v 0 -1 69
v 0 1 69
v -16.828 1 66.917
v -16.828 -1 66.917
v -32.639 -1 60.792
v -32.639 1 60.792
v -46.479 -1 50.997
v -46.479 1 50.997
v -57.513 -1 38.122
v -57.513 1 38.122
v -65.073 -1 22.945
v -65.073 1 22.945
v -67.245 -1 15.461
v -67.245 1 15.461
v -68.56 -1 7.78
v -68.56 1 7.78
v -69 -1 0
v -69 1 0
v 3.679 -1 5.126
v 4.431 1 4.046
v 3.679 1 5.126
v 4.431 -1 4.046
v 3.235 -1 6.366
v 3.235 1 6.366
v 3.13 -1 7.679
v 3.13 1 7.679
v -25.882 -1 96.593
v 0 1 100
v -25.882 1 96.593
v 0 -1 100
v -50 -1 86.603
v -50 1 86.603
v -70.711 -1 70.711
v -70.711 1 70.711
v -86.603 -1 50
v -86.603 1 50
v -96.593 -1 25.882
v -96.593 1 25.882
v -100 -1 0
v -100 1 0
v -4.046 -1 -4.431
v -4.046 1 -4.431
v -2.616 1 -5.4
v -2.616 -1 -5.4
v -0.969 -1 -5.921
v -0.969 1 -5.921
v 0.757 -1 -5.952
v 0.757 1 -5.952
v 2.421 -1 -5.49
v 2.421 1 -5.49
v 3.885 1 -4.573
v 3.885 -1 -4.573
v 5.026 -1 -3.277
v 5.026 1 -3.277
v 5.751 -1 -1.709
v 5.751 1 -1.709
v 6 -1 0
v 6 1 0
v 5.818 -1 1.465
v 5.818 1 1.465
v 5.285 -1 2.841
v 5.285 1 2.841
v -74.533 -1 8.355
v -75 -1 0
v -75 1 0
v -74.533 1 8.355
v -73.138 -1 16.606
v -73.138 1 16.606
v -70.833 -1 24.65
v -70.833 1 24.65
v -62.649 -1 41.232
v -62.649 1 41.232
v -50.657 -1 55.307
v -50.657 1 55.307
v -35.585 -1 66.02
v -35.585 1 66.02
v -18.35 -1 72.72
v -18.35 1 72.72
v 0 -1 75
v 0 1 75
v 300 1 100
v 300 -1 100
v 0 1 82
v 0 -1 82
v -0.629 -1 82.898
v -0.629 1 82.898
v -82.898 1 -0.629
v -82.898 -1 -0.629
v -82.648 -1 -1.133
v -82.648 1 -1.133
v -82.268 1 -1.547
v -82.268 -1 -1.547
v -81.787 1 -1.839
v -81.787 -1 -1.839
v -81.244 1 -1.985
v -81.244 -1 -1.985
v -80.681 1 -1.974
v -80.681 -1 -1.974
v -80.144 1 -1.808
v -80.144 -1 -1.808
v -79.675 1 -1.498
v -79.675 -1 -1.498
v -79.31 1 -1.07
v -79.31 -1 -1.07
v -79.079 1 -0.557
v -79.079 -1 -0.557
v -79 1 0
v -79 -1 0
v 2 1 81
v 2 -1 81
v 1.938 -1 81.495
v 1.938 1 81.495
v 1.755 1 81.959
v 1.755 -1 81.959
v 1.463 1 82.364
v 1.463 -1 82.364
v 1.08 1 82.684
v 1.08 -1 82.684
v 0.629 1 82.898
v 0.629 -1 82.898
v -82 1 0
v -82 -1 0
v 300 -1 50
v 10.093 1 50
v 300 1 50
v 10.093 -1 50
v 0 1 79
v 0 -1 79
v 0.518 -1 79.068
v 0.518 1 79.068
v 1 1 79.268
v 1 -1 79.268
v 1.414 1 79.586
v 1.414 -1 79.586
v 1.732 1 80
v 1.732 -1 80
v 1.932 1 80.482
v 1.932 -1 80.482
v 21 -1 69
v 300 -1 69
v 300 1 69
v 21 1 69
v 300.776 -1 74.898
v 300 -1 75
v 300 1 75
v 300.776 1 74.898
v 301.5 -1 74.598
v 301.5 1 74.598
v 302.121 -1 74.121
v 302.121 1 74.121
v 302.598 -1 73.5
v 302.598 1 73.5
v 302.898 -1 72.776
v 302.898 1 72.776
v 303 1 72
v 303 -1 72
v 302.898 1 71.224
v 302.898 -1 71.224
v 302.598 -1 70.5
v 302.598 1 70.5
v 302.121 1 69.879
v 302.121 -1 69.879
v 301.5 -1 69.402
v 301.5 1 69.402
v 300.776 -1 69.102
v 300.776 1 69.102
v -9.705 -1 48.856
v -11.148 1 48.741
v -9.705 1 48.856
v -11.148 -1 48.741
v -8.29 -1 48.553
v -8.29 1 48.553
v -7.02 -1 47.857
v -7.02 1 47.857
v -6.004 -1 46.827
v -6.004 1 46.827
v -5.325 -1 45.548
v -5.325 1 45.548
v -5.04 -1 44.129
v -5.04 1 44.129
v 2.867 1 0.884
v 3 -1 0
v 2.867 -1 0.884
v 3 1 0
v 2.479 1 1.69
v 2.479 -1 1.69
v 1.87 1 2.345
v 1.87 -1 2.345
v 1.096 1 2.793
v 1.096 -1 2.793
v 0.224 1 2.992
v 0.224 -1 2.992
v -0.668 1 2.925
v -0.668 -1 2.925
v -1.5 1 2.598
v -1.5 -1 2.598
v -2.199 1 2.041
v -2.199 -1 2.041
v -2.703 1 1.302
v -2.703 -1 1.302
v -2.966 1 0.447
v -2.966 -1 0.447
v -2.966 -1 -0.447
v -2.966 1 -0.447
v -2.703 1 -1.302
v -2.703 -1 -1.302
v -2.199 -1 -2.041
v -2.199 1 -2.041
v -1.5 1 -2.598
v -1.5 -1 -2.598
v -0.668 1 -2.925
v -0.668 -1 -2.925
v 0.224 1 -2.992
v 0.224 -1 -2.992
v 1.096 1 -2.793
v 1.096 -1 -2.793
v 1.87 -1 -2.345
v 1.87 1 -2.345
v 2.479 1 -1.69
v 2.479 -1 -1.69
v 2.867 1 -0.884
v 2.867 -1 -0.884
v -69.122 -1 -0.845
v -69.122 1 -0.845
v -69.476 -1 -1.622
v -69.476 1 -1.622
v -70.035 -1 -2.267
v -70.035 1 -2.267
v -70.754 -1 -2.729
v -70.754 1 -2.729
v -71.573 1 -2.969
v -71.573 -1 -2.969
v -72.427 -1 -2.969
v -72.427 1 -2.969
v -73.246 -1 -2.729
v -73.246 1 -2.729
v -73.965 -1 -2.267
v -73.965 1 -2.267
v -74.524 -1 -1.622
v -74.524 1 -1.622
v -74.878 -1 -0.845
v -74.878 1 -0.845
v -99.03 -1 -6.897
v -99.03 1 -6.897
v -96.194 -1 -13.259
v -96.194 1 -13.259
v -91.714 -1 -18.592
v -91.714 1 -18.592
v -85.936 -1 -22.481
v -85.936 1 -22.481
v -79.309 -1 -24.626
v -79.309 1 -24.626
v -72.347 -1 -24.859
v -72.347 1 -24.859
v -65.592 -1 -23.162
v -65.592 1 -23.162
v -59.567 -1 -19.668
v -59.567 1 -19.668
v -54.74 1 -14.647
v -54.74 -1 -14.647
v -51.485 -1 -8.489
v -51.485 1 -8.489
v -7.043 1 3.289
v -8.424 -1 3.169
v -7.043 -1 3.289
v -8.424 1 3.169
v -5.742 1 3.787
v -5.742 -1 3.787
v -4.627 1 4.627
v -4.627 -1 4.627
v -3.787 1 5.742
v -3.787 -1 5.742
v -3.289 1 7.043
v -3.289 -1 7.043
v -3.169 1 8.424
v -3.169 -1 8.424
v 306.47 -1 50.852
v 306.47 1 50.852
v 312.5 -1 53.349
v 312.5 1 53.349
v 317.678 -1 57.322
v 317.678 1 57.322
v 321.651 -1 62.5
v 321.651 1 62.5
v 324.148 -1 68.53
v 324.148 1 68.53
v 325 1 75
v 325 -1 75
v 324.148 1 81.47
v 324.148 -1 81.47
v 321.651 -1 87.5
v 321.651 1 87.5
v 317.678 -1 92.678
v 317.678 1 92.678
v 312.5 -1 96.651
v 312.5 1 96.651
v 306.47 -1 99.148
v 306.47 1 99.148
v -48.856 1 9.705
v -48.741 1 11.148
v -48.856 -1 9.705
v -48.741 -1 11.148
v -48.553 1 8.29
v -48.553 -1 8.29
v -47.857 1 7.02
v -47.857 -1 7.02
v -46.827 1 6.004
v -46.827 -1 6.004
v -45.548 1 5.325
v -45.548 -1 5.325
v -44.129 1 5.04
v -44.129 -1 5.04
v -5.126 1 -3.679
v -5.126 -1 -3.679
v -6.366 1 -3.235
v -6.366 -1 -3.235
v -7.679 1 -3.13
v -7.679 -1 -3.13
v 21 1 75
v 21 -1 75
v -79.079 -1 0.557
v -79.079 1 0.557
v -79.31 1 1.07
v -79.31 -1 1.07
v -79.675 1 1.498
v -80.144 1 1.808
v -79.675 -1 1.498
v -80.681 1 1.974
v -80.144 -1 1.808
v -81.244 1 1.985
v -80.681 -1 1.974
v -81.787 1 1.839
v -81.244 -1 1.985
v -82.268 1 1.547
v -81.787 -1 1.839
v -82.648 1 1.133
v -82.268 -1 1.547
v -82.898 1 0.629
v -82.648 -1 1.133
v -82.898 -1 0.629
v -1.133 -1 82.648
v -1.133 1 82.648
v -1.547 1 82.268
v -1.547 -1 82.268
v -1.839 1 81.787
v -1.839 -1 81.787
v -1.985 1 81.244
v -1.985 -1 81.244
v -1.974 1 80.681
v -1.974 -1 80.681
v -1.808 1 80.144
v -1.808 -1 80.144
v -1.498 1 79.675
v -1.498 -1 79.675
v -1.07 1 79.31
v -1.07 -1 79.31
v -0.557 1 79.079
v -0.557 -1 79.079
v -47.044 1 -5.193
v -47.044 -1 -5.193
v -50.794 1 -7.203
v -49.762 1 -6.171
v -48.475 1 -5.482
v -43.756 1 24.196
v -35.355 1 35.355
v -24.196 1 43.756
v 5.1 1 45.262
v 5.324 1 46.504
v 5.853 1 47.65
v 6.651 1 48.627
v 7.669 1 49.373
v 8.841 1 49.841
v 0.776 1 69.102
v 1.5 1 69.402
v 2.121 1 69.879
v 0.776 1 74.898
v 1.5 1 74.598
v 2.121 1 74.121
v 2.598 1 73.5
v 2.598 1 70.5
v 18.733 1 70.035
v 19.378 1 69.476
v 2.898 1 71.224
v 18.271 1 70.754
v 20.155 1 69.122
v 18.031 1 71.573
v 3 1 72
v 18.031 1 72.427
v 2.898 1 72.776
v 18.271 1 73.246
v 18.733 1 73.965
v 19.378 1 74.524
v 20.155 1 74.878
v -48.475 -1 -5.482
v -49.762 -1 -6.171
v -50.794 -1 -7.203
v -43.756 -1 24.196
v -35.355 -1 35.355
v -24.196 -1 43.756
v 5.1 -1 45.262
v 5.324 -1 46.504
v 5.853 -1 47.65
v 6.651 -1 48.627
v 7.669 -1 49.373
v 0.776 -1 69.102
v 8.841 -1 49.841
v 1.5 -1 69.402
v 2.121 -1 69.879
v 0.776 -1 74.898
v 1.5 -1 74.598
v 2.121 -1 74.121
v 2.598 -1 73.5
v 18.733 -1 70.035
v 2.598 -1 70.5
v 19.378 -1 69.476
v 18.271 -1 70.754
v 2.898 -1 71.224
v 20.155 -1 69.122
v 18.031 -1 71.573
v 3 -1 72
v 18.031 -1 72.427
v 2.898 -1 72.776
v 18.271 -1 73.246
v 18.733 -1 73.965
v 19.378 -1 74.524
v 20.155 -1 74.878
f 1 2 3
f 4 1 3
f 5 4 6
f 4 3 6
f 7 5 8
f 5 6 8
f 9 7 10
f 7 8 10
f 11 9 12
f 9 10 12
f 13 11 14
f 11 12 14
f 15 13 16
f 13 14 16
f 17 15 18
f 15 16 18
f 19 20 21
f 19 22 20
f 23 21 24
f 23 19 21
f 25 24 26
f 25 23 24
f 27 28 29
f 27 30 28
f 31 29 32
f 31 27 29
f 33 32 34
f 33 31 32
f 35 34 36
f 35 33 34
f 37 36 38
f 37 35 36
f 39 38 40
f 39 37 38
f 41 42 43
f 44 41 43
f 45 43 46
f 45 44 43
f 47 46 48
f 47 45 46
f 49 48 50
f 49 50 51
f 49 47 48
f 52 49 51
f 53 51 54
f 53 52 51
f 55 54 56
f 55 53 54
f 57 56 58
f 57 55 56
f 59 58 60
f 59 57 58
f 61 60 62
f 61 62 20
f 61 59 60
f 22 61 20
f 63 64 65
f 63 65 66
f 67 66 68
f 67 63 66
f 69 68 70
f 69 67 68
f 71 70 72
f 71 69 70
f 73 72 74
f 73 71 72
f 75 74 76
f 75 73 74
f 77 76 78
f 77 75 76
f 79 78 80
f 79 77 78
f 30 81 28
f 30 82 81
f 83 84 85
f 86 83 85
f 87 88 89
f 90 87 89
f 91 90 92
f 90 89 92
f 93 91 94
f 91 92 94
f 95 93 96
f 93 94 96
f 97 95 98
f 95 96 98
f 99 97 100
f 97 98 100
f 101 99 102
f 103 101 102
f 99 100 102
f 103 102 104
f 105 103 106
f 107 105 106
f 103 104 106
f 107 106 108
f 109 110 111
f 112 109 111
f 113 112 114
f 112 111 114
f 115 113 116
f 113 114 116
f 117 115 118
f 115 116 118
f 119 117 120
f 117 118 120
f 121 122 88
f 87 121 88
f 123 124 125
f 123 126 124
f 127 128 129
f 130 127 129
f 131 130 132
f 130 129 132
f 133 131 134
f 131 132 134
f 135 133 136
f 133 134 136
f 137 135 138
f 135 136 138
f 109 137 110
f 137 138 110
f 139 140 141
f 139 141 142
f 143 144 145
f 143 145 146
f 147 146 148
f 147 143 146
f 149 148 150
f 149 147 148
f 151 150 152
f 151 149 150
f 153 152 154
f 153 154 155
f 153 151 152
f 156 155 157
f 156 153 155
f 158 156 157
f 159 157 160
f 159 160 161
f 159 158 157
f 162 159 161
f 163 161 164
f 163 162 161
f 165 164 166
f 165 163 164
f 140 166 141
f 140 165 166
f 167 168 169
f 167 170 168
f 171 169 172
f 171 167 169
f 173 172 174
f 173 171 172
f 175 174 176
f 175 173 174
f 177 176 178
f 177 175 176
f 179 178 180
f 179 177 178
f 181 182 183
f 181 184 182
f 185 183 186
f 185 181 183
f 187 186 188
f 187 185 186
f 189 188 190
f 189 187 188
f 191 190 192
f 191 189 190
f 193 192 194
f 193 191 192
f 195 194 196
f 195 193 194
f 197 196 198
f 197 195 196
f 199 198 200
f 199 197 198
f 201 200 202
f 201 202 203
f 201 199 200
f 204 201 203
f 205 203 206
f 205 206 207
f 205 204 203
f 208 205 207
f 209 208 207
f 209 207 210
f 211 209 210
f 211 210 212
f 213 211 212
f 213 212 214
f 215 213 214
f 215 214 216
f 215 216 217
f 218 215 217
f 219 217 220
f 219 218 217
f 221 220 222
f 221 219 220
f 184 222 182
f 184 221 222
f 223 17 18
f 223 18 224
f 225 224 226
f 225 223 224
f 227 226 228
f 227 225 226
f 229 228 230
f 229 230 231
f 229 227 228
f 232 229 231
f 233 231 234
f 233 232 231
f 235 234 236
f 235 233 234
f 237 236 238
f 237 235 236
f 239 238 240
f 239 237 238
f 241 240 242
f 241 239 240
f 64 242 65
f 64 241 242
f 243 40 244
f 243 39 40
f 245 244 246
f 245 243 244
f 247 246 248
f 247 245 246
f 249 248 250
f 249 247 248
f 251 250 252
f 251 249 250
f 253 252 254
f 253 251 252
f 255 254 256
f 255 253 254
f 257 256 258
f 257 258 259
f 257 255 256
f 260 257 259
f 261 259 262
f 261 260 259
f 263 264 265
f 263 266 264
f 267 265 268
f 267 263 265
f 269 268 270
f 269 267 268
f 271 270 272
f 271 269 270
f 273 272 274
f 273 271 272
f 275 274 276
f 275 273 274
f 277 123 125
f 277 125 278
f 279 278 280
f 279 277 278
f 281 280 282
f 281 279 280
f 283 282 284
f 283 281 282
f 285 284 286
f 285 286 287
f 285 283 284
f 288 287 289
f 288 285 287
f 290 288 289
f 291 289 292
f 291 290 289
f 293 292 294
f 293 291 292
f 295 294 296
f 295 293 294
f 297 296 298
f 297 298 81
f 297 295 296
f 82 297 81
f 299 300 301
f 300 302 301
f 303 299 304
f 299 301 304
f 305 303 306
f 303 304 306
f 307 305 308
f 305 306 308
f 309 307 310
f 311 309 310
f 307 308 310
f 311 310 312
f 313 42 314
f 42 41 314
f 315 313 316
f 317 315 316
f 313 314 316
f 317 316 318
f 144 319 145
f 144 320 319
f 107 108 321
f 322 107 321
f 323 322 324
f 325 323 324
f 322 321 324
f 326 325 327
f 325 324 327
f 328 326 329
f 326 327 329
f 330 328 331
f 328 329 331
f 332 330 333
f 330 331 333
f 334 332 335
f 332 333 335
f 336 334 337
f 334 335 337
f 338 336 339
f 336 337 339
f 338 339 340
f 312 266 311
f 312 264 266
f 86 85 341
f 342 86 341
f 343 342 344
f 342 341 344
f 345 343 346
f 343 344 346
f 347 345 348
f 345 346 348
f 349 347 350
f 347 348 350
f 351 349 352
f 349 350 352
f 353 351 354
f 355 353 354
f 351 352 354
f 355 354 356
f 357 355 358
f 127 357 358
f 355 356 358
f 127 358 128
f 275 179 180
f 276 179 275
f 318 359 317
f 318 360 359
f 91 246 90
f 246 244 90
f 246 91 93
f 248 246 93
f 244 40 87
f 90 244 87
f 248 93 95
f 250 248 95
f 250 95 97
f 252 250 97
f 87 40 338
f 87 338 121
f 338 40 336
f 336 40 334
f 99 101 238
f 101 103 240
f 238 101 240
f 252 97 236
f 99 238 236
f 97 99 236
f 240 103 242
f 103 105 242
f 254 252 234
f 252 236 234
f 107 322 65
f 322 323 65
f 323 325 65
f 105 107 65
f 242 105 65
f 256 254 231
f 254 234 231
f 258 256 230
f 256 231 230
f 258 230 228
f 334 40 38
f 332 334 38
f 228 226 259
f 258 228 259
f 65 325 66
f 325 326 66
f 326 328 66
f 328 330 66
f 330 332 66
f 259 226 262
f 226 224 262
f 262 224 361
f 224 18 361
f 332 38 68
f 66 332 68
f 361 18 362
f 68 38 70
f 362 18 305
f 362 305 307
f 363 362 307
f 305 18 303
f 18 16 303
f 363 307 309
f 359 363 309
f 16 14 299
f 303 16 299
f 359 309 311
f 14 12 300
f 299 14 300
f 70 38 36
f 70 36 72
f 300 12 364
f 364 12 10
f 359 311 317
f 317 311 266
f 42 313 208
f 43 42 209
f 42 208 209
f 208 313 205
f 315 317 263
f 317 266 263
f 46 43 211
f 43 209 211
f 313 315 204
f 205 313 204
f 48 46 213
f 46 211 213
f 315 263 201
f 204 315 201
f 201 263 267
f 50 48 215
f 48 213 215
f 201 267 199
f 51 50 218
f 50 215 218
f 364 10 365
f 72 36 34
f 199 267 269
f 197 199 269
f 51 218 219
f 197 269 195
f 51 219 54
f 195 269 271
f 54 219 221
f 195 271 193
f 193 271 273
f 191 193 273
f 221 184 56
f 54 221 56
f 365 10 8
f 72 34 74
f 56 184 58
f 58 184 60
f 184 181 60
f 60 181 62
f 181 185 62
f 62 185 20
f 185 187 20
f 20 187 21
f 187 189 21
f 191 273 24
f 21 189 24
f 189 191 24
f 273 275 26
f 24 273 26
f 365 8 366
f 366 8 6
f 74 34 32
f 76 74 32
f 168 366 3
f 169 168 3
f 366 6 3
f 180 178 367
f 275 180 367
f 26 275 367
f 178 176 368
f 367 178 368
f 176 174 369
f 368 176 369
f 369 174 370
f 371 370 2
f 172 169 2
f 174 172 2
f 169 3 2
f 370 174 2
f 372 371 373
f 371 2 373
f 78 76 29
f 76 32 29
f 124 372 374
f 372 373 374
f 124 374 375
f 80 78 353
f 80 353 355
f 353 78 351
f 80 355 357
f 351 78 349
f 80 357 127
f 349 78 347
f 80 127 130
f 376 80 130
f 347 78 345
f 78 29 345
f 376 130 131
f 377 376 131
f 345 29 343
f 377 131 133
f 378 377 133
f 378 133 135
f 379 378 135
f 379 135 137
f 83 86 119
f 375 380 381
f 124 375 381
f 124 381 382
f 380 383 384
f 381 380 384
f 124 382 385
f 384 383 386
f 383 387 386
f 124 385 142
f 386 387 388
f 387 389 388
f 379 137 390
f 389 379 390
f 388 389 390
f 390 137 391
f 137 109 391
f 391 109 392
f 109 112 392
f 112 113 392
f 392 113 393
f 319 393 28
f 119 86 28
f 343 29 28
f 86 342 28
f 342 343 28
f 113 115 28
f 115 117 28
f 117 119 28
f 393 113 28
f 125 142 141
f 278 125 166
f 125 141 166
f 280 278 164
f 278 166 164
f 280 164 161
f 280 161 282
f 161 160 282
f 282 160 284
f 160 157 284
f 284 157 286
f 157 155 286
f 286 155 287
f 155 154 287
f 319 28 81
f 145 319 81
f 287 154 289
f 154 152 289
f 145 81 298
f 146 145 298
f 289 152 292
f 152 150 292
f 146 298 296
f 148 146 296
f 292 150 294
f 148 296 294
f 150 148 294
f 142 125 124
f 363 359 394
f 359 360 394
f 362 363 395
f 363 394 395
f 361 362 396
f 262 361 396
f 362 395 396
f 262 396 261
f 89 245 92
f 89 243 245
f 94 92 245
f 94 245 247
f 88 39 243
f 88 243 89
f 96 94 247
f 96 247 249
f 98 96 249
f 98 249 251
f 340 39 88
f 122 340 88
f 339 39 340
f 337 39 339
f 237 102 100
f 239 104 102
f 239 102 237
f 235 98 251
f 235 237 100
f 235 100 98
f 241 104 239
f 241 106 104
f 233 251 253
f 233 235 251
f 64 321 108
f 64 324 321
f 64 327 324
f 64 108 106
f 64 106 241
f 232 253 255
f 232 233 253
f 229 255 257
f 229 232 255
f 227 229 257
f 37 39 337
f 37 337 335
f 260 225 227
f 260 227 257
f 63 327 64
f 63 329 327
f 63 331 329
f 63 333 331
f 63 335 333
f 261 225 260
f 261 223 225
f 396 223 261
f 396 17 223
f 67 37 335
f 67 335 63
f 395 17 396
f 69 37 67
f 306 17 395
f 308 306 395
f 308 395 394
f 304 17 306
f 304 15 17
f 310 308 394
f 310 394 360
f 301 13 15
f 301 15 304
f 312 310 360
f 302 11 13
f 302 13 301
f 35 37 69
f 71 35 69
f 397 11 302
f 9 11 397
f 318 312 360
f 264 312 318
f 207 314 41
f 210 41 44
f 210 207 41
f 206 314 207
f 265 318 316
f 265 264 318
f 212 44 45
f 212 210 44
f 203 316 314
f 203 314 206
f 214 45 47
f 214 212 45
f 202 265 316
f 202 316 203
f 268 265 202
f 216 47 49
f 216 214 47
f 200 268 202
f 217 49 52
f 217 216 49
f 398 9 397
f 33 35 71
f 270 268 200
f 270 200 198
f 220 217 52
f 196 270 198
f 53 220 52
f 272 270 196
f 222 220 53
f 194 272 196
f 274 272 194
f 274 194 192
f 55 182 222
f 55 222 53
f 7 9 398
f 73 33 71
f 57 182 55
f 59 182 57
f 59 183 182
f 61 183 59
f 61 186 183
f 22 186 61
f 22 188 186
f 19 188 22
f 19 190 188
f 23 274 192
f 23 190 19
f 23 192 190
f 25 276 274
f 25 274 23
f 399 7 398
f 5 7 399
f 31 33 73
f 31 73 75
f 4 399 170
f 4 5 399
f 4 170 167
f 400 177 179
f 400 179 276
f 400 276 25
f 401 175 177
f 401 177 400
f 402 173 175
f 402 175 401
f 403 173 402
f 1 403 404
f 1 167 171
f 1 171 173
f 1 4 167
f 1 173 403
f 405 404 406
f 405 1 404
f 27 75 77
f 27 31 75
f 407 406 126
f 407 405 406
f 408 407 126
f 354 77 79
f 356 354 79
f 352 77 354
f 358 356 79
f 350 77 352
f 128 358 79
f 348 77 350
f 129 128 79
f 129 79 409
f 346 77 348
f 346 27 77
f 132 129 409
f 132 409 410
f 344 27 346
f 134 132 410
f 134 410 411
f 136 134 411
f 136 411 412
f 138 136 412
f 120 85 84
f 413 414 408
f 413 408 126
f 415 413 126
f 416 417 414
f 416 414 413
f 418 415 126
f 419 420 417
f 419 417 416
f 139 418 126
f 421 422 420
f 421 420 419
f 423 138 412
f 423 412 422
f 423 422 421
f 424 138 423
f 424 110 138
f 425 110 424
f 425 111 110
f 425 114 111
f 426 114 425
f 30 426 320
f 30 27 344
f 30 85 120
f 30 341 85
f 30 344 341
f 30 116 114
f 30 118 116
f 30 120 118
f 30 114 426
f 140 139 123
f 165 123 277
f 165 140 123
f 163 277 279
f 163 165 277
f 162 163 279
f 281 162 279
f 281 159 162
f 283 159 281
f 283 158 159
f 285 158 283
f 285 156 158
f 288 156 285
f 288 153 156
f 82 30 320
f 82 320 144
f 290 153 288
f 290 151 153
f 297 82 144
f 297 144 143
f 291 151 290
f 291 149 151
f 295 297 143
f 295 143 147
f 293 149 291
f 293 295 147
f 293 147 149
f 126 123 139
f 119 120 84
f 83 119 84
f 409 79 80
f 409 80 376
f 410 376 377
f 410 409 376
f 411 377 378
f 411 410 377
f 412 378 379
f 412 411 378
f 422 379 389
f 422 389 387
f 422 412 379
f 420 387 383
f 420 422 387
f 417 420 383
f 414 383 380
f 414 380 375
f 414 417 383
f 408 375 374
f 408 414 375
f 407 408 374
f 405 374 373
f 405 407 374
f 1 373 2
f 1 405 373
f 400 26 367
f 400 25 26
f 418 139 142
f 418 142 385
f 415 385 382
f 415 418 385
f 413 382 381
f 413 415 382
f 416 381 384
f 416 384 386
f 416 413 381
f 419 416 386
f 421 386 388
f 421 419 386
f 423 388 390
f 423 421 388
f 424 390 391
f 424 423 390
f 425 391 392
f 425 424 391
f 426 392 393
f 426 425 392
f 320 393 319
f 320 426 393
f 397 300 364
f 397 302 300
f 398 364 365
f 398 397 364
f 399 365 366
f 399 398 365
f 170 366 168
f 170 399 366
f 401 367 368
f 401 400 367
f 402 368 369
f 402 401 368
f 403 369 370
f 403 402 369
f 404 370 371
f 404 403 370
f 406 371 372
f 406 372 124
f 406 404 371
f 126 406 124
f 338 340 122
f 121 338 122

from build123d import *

# Parameters (mm, degrees)
F0_R     = 3
F1_DEPTH = 1
F2_R     = 5
F2_R_2   = 4.99999
F6_DEPTH = 25


# Not quite as in the source:
# - a fillet or chamfer is up to 0.001 mm smaller than in the source, because OpenCascade refuses the exact size
# - a feature of the source that left no trace in its solid (it failed there, or was rolled back) is left out


with BuildPart() as f1:
    # F0 (on Front) → F1 (new body, symmetric)
    with BuildSketch(Plane.XZ):
        with BuildLine():
            ThreePointArc((-70.8333333333, 24.6503324296), (-91.1374306092, 19.0940653956), (-100, 0))
            ThreePointArc((-100, 0), (-77.7052620956, -24.8532001359), (-50.5854754405, -5.3787536225))
            ThreePointArc((-50.5854754405, -5.3787536225), (-50.1467998641, -2.7052620956), (-50, 0))
            ThreePointArc((-50, 0), (-54.1054233512, 13.7264950613), (-65.0733333333, 22.9447442542))
            ThreePointArc((-65.0733333333, 22.9447442542), (-68.0112490695, 11.6391580452), (-69, 0))
            ThreePointArc((-69, 0), (-72, -3), (-75, 0))
            ThreePointArc((-75, 0), (-73.9509972887, 12.5), (-70.8333333333, 24.6503324296))
        make_face()
        with BuildLine():
            ThreePointArc((-50, 0), (-50.1467998641, -2.7052620956), (-50.5854754405, -5.3787536225))
            Line((-50.5854754405, -5.3787536225), (-5.1961524227, -3))
            ThreePointArc((-5.1961524227, -3), (-6, 0), (-5.1961524227, 3))
            Line((-5.1961524227, 3), (-49.7147645476, 5.3331215982))
            ThreePointArc((-49.7147645476, 5.3331215982), (-49.9286402147, 2.6703719425), (-50, 0))
        make_face()
        with BuildLine():
            Line((300, 100), (0, 100))
            ThreePointArc((0, 100), (-70.7106781187, 70.7106781187), (-100, 0))
            ThreePointArc((-100, 0), (-91.1374306092, 19.0940653956), (-70.8333333333, 24.6503324296))
            ThreePointArc((-70.8333333333, 24.6503324296), (-43.4524168935, 61.1300864232), (0, 75))
            ThreePointArc((0, 75), (2.1213203436, 74.1213203436), (3, 72))
            ThreePointArc((3, 72), (2.1213203436, 69.8786796564), (0, 69))
            ThreePointArc((0, 69), (-39.861087833, 56.3213429951), (-65.0733333333, 22.9447442542))
            ThreePointArc((-65.0733333333, 22.9447442542), (-54.1054233512, 13.7264950613), (-50, 0))
            ThreePointArc((-50, 0), (-49.9286402147, 2.6703719425), (-49.7147645476, 5.3331215982))
            ThreePointArc((-49.7147645476, 5.3331215982), (-35.3553390593, 35.3553390593), (-5.3331215982, 49.7147645476))
            ThreePointArc((-5.3331215982, 49.7147645476), (-2.6703719425, 49.9286402147), (0, 50))
            Line((0, 50), (5.3480701549, 50))
            Line((5.3480701549, 50), (300, 50))
            ThreePointArc((300, 50), (284.5889649926, 55.314980315), (275.730677801, 69))
            Line((275.730677801, 69), (21, 69))
            ThreePointArc((21, 69), (18, 72), (21, 75))
            Line((21, 75), (275, 75))
            ThreePointArc((275, 75), (282.3223304703, 92.6776695297), (300, 100))
        make_face()
        with BuildLine():
            Line((3, 5.1961524227), (5.3480701549, 50))
            Line((5.3480701549, 50), (0, 50))
            ThreePointArc((0, 50), (-2.6703719425, 49.9286402147), (-5.3331215982, 49.7147645476))
            Line((-5.3331215982, 49.7147645476), (-3, 5.1961524227))
            ThreePointArc((-3, 5.1961524227), (0, 6), (3, 5.1961524227))
        make_face()
        with BuildLine():
            ThreePointArc((-5.1961524227, 3), (-6, 0), (-5.1961524227, -3))
            ThreePointArc((-5.1961524227, -3), (1.5529142706, -5.7955549577), (6, 0))
            ThreePointArc((6, 0), (5.1961524227, 3), (3, 5.1961524227))
            ThreePointArc((3, 5.1961524227), (0, 6), (-3, 5.1961524227))
            ThreePointArc((-3, 5.1961524227), (-4.2426406871, 4.2426406871), (-5.1961524227, 3))
        make_face()
        Circle(F0_R, mode=Mode.SUBTRACT)
        with BuildLine():
            ThreePointArc((325, 75), (317.6776695297, 92.6776695297), (300, 100))
            ThreePointArc((300, 100), (282.3223304703, 92.6776695297), (275, 75))
            Line((275, 75), (300, 75))
            ThreePointArc((300, 75), (302.1213203436, 74.1213203436), (303, 72))
            ThreePointArc((303, 72), (302.1213203436, 69.8786796564), (300, 69))
            Line((300, 69), (275.730677801, 69))
            ThreePointArc((275.730677801, 69), (284.5889649926, 55.314980315), (300, 50))
            ThreePointArc((300, 50), (317.6776695297, 57.3223304703), (325, 75))
        make_face()
    extrude(amount=F1_DEPTH, both=True)

    # F2 (call 1 of 8: OpenCascade refuses the feature's edges together)
    f2_edges = [f1.edges().sort_by_distance(p)[0] for p in [
        (-49.714765, 0, 5.333122),
    ]]
    fillet(f2_edges, radius=F2_R)

    # F2#2 (call 2 of 8)
    f2_2_edges = [f1.edges().sort_by_distance(p)[0] for p in [
        (5.34807, 0, 50),
    ]]
    fillet(f2_2_edges, radius=F2_R)

    # F2#3 (call 3 of 8)
    f2_3_edges = [f1.edges().sort_by_distance(p)[0] for p in [
        (-5.333122, 0, 49.714765),
    ]]
    fillet(f2_3_edges, radius=F2_R)

    # F2#4 (call 4 of 8)
    f2_4_edges = [f1.edges().sort_by_distance(p)[0] for p in [
        (-5.196152, 0, -3),
    ]]
    fillet(f2_4_edges, radius=F2_R)

    # F2#5 (call 5 of 8)
    f2_5_edges = [f1.edges().sort_by_distance(p)[0] for p in [
        (-50.585475, 0, -5.378754),
    ]]
    fillet(f2_5_edges, radius=F2_R)

    # F2#6 (call 6 of 8)
    f2_6_edges = [f1.edges().sort_by_distance(p)[0] for p in [
        (-5.196152, 0, 3),
    ]]
    fillet(f2_6_edges, radius=F2_R)

    # F2#7 (call 7 of 8) (radius 5 in the source; OpenCascade refuses exactly that, so slightly less here)
    f2_7_edges = [f1.edges().sort_by_distance(p)[0] for p in [
        (-3, 0, 5.196152),
    ]]
    fillet(f2_7_edges, radius=F2_R_2)

    # F2#8 (call 8 of 8)
    f2_8_edges = [f1.edges().sort_by_distance(p)[0] for p in [
        (3, 0, 5.196152),
    ]]
    fillet(f2_8_edges, radius=F2_R)

    # F5 (on face) → F6 (cut)
    with BuildSketch(Plane.XZ.offset(1)):
        with BuildLine():
            Line((-82, 0), (-79, 0))
            ThreePointArc((-79, 0), (-80.6813707911, 1.9744557294), (-82.8984754272, 0.629119267))
            Line((-82.8984754272, 0.629119267), (-82, 0))
        make_face()
        with BuildLine():
            ThreePointArc((-82.8984754272, -0.629119267), (-80.6813707911, -1.9744557294), (-79, 0))
            Line((-79, 0), (-82, 0))
            Line((-82, 0), (-82.8984754272, -0.629119267))
        make_face()
        with BuildLine():
            ThreePointArc((-0.629119267, 82.8984754272), (-1.9744557294, 80.6813707911), (0, 79))
            Line((0, 79), (0, 82))
            Line((0, 82), (-0.629119267, 82.8984754272))
        make_face()
        with BuildLine():
            Line((0, 82), (0, 79))
            ThreePointArc((0, 79), (1.4142135624, 79.5857864376), (2, 81))
            ThreePointArc((2, 81), (1.6214559097, 82.1708461611), (0.629119267, 82.8984754272))
            Line((0.629119267, 82.8984754272), (0, 82))
        make_face()
    extrude(amount=-F6_DEPTH, mode=Mode.SUBTRACT)


solid = f1.part
